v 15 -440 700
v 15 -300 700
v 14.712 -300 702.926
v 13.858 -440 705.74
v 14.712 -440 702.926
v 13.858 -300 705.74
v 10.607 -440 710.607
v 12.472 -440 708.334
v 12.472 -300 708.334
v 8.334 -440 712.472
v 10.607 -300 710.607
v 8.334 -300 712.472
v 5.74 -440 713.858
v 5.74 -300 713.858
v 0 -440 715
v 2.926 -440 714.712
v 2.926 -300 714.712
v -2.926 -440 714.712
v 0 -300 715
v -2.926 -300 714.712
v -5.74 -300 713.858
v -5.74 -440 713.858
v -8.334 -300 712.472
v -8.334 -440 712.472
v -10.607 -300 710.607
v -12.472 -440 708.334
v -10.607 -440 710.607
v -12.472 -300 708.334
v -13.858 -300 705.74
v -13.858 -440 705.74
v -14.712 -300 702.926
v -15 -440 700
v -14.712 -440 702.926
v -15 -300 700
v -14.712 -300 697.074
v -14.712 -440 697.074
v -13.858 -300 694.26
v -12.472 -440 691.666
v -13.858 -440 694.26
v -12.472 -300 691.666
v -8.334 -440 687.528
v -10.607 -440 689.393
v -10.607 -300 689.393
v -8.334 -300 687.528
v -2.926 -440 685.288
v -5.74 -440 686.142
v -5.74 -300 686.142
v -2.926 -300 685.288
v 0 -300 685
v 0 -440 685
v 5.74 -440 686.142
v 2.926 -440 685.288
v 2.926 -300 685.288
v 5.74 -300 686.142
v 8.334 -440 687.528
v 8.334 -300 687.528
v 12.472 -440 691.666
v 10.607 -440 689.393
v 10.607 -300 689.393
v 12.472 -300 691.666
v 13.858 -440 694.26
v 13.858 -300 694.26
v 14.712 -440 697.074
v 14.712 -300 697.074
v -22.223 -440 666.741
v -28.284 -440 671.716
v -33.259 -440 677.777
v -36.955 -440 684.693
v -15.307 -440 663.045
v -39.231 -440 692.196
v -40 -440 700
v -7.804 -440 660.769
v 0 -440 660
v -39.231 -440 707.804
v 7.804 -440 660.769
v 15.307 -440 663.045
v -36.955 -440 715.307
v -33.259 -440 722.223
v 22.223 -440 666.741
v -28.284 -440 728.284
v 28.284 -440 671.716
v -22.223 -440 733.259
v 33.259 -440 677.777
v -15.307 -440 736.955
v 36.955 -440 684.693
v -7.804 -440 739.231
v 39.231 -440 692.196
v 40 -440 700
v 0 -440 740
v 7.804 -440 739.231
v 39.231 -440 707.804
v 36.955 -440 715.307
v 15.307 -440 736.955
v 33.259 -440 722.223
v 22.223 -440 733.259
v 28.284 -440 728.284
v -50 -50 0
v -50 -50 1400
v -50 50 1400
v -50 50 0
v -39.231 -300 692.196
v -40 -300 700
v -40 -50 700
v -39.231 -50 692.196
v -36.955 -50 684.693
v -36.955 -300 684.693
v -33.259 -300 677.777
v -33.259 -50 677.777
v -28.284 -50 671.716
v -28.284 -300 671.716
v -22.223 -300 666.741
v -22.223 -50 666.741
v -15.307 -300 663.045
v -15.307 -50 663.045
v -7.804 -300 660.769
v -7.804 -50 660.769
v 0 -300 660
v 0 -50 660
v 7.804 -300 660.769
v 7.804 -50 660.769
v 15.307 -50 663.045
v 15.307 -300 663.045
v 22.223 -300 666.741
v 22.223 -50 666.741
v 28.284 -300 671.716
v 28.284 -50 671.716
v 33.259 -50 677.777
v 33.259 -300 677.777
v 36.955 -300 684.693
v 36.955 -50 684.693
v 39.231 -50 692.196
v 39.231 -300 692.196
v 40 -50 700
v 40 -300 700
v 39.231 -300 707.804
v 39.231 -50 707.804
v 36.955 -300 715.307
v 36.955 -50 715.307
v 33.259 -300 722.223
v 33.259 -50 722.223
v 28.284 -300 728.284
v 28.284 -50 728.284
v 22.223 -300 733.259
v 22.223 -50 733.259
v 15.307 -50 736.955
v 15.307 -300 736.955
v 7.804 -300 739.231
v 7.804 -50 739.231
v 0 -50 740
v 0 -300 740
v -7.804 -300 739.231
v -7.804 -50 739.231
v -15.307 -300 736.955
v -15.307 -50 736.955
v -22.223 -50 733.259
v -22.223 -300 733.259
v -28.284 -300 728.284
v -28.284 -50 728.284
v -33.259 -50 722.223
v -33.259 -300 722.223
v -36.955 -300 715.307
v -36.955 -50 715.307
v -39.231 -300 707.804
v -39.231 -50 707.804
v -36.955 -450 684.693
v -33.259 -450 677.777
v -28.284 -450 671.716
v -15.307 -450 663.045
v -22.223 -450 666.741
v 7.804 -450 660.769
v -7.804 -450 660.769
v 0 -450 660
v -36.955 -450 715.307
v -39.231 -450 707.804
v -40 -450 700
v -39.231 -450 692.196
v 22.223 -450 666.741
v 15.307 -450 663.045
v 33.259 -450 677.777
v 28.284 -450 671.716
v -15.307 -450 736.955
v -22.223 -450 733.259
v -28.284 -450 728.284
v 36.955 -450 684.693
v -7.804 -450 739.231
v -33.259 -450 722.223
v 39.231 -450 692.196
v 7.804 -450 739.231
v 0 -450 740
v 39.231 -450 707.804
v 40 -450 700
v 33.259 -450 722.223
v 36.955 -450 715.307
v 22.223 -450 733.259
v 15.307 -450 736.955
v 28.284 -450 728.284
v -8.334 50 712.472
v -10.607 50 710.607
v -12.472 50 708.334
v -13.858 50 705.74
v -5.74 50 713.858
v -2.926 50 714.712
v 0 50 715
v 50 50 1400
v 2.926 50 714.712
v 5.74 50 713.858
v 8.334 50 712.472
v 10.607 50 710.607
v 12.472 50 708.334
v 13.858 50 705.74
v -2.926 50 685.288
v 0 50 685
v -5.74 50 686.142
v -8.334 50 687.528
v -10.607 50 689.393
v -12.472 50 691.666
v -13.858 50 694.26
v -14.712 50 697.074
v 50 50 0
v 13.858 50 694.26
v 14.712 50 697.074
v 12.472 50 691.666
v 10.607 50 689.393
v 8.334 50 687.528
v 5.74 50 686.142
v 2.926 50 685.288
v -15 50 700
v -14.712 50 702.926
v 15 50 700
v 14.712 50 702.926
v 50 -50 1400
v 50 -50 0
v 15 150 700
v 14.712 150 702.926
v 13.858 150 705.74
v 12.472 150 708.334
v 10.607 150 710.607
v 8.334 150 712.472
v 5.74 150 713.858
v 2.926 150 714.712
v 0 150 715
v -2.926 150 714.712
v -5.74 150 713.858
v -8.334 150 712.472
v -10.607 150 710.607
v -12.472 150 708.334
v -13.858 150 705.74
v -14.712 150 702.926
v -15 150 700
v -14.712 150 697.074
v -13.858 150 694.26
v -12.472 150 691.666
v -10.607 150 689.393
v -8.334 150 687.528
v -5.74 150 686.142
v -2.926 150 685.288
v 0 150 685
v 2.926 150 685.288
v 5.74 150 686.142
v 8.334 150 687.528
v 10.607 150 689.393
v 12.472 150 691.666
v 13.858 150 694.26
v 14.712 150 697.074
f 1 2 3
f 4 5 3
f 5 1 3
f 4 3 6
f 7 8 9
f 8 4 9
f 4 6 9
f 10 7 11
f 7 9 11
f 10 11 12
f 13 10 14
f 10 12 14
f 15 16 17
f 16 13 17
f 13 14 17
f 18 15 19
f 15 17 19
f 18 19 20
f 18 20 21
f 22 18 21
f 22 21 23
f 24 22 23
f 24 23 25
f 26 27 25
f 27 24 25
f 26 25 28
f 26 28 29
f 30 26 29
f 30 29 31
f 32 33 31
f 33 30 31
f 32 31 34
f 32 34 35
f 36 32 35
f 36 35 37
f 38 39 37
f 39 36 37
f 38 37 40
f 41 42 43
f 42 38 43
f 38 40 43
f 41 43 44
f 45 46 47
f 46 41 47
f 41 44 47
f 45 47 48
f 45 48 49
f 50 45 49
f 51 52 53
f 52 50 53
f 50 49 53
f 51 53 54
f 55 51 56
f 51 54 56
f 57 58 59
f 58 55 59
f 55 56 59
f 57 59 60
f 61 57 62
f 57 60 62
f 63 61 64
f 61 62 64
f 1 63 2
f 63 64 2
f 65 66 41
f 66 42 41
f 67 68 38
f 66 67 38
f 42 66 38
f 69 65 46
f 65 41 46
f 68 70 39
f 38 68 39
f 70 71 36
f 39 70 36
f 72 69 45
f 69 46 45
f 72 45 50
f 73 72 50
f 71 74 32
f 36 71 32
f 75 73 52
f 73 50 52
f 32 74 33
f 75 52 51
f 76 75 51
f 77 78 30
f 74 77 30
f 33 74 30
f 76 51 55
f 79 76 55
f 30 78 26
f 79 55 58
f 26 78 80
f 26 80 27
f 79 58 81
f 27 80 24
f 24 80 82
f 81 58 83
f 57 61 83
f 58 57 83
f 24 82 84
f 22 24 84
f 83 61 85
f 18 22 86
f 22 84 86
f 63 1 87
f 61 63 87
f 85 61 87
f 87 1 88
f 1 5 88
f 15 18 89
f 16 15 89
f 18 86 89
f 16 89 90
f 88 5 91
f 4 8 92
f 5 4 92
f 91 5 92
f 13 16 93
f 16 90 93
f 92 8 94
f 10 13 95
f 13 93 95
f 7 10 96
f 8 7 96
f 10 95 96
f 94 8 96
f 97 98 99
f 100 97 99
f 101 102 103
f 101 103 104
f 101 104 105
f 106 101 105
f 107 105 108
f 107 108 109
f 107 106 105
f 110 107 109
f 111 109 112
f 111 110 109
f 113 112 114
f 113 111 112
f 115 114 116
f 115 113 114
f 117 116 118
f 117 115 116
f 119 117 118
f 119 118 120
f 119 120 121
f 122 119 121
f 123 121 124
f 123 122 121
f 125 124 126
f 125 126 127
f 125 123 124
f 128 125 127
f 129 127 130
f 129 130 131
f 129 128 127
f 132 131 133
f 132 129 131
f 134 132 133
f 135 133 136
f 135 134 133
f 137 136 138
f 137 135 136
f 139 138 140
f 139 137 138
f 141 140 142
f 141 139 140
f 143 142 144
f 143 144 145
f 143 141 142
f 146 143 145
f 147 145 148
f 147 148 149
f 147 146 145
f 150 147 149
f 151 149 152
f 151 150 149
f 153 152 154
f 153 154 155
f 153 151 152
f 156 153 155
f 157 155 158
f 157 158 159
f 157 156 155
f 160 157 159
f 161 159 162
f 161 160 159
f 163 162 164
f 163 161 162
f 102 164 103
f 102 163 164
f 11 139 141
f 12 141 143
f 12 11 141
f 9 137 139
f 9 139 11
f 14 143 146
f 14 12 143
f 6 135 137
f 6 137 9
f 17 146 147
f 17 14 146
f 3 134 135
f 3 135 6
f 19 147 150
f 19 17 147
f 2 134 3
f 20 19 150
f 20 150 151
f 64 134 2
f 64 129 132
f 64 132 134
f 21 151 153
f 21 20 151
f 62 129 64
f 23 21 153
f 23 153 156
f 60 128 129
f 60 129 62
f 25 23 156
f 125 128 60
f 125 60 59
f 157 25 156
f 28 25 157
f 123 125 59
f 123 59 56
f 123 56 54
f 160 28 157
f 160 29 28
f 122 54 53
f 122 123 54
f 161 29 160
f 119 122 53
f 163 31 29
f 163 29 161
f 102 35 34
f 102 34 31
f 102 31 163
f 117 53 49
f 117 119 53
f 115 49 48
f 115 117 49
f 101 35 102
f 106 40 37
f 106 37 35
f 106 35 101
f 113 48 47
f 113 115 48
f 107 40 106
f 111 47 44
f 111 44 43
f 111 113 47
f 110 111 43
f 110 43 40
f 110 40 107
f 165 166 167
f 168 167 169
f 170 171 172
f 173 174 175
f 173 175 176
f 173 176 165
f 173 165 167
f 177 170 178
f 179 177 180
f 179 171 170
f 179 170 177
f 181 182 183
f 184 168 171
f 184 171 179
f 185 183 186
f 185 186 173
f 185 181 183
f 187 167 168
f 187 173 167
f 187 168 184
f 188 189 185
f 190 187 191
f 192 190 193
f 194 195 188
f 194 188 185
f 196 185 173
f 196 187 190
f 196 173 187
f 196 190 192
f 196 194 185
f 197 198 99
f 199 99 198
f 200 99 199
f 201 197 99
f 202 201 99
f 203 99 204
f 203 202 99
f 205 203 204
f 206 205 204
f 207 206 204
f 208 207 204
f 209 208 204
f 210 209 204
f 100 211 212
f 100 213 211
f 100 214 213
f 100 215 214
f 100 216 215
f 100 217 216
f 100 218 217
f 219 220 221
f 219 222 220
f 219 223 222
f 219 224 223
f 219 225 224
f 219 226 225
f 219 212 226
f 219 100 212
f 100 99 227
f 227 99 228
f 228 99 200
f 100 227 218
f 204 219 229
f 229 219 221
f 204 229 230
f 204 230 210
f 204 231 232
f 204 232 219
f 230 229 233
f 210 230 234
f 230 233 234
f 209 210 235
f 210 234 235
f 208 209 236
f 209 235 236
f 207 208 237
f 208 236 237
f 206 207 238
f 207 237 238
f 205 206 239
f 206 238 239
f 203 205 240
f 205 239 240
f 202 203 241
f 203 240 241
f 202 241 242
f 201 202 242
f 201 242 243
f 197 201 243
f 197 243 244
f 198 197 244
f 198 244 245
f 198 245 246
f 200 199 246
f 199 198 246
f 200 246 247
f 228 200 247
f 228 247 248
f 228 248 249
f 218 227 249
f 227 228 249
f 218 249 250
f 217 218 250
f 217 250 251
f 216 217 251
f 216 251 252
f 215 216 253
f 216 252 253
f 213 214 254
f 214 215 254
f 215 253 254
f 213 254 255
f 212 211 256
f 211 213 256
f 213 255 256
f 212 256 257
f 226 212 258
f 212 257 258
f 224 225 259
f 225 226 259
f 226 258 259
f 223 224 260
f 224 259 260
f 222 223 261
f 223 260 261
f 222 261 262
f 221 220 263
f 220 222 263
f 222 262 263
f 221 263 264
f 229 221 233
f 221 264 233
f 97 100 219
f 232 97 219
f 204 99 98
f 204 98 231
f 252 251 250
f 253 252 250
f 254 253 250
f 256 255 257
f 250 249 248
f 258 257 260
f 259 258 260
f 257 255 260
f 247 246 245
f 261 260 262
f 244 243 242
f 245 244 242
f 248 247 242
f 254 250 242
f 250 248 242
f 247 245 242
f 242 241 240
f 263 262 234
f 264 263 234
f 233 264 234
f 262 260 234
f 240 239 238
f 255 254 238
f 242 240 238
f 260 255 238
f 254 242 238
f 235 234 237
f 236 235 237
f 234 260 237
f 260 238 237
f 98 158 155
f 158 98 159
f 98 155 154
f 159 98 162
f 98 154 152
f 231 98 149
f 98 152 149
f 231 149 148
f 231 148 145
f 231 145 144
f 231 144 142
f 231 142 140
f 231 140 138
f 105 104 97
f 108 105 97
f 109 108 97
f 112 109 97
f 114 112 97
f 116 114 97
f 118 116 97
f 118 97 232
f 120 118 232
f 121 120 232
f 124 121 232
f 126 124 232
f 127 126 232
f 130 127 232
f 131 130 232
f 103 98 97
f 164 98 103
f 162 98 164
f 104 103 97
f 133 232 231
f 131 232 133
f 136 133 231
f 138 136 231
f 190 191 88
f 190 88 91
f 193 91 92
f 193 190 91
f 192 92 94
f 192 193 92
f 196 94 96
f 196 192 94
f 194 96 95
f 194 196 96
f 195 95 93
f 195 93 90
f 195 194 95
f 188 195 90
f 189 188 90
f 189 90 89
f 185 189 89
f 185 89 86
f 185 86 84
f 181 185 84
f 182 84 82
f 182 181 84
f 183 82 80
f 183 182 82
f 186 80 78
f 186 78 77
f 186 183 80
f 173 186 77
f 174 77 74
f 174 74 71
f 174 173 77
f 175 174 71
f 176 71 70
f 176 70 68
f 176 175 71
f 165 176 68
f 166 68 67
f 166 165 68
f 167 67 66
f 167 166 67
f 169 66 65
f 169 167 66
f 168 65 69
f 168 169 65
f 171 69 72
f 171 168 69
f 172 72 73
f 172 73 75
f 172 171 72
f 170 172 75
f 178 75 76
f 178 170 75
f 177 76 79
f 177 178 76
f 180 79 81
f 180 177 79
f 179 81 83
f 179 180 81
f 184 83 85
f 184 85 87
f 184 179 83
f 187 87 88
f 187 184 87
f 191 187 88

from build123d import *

# Parameters (mm, degrees)
SKETCH1_W                = 100
SKETCH1_H                = 100
BOSS_EXTRUDE1_DEPTH      = 1400
BOSS_EXTRUDE3_DEPTH      = 400
BOSS_EXTRUDE3_DEPTH_BACK = 200
SKETCH3_R                = 15
SKETCH4_R                = 40
BOSS_EXTRUDE4_DEPTH      = 10
BOSS_EXTRUDE5_START      = 250
SKETCH5_R                = 40
BOSS_EXTRUDE5_DEPTH      = 250


with BuildPart() as part:
    # Sketch1 → Boss-Extrude1 (new body)
    with BuildSketch(Plane.XY):
        Rectangle(SKETCH1_W, SKETCH1_H)
    extrude(amount=BOSS_EXTRUDE1_DEPTH)

    # Sketch3 → Boss-Extrude3 (add, two sides: drawn at the far end of the back side and taken through both)
    with BuildSketch(Plane.XZ.offset(50).offset(-BOSS_EXTRUDE3_DEPTH_BACK)):
        with Locations((0, 700)):
            Circle(SKETCH3_R)
    extrude(amount=BOSS_EXTRUDE3_DEPTH + BOSS_EXTRUDE3_DEPTH_BACK)

    # Sketch4 → Boss-Extrude4 (add)
    with BuildSketch(Plane.XZ.offset(450)):
        with Locations((0, 700)):
            Circle(SKETCH4_R)
    extrude(amount=-BOSS_EXTRUDE4_DEPTH)

    # Sketch5 → Boss-Extrude5 (add)
    with BuildSketch(Plane.XZ.offset(50).offset(BOSS_EXTRUDE5_START)):
        with Locations(Location((0, 700, 0), (0, 0, 180))):
            Circle(SKETCH5_R)
    extrude(amount=-BOSS_EXTRUDE5_DEPTH)


solid = part.part
